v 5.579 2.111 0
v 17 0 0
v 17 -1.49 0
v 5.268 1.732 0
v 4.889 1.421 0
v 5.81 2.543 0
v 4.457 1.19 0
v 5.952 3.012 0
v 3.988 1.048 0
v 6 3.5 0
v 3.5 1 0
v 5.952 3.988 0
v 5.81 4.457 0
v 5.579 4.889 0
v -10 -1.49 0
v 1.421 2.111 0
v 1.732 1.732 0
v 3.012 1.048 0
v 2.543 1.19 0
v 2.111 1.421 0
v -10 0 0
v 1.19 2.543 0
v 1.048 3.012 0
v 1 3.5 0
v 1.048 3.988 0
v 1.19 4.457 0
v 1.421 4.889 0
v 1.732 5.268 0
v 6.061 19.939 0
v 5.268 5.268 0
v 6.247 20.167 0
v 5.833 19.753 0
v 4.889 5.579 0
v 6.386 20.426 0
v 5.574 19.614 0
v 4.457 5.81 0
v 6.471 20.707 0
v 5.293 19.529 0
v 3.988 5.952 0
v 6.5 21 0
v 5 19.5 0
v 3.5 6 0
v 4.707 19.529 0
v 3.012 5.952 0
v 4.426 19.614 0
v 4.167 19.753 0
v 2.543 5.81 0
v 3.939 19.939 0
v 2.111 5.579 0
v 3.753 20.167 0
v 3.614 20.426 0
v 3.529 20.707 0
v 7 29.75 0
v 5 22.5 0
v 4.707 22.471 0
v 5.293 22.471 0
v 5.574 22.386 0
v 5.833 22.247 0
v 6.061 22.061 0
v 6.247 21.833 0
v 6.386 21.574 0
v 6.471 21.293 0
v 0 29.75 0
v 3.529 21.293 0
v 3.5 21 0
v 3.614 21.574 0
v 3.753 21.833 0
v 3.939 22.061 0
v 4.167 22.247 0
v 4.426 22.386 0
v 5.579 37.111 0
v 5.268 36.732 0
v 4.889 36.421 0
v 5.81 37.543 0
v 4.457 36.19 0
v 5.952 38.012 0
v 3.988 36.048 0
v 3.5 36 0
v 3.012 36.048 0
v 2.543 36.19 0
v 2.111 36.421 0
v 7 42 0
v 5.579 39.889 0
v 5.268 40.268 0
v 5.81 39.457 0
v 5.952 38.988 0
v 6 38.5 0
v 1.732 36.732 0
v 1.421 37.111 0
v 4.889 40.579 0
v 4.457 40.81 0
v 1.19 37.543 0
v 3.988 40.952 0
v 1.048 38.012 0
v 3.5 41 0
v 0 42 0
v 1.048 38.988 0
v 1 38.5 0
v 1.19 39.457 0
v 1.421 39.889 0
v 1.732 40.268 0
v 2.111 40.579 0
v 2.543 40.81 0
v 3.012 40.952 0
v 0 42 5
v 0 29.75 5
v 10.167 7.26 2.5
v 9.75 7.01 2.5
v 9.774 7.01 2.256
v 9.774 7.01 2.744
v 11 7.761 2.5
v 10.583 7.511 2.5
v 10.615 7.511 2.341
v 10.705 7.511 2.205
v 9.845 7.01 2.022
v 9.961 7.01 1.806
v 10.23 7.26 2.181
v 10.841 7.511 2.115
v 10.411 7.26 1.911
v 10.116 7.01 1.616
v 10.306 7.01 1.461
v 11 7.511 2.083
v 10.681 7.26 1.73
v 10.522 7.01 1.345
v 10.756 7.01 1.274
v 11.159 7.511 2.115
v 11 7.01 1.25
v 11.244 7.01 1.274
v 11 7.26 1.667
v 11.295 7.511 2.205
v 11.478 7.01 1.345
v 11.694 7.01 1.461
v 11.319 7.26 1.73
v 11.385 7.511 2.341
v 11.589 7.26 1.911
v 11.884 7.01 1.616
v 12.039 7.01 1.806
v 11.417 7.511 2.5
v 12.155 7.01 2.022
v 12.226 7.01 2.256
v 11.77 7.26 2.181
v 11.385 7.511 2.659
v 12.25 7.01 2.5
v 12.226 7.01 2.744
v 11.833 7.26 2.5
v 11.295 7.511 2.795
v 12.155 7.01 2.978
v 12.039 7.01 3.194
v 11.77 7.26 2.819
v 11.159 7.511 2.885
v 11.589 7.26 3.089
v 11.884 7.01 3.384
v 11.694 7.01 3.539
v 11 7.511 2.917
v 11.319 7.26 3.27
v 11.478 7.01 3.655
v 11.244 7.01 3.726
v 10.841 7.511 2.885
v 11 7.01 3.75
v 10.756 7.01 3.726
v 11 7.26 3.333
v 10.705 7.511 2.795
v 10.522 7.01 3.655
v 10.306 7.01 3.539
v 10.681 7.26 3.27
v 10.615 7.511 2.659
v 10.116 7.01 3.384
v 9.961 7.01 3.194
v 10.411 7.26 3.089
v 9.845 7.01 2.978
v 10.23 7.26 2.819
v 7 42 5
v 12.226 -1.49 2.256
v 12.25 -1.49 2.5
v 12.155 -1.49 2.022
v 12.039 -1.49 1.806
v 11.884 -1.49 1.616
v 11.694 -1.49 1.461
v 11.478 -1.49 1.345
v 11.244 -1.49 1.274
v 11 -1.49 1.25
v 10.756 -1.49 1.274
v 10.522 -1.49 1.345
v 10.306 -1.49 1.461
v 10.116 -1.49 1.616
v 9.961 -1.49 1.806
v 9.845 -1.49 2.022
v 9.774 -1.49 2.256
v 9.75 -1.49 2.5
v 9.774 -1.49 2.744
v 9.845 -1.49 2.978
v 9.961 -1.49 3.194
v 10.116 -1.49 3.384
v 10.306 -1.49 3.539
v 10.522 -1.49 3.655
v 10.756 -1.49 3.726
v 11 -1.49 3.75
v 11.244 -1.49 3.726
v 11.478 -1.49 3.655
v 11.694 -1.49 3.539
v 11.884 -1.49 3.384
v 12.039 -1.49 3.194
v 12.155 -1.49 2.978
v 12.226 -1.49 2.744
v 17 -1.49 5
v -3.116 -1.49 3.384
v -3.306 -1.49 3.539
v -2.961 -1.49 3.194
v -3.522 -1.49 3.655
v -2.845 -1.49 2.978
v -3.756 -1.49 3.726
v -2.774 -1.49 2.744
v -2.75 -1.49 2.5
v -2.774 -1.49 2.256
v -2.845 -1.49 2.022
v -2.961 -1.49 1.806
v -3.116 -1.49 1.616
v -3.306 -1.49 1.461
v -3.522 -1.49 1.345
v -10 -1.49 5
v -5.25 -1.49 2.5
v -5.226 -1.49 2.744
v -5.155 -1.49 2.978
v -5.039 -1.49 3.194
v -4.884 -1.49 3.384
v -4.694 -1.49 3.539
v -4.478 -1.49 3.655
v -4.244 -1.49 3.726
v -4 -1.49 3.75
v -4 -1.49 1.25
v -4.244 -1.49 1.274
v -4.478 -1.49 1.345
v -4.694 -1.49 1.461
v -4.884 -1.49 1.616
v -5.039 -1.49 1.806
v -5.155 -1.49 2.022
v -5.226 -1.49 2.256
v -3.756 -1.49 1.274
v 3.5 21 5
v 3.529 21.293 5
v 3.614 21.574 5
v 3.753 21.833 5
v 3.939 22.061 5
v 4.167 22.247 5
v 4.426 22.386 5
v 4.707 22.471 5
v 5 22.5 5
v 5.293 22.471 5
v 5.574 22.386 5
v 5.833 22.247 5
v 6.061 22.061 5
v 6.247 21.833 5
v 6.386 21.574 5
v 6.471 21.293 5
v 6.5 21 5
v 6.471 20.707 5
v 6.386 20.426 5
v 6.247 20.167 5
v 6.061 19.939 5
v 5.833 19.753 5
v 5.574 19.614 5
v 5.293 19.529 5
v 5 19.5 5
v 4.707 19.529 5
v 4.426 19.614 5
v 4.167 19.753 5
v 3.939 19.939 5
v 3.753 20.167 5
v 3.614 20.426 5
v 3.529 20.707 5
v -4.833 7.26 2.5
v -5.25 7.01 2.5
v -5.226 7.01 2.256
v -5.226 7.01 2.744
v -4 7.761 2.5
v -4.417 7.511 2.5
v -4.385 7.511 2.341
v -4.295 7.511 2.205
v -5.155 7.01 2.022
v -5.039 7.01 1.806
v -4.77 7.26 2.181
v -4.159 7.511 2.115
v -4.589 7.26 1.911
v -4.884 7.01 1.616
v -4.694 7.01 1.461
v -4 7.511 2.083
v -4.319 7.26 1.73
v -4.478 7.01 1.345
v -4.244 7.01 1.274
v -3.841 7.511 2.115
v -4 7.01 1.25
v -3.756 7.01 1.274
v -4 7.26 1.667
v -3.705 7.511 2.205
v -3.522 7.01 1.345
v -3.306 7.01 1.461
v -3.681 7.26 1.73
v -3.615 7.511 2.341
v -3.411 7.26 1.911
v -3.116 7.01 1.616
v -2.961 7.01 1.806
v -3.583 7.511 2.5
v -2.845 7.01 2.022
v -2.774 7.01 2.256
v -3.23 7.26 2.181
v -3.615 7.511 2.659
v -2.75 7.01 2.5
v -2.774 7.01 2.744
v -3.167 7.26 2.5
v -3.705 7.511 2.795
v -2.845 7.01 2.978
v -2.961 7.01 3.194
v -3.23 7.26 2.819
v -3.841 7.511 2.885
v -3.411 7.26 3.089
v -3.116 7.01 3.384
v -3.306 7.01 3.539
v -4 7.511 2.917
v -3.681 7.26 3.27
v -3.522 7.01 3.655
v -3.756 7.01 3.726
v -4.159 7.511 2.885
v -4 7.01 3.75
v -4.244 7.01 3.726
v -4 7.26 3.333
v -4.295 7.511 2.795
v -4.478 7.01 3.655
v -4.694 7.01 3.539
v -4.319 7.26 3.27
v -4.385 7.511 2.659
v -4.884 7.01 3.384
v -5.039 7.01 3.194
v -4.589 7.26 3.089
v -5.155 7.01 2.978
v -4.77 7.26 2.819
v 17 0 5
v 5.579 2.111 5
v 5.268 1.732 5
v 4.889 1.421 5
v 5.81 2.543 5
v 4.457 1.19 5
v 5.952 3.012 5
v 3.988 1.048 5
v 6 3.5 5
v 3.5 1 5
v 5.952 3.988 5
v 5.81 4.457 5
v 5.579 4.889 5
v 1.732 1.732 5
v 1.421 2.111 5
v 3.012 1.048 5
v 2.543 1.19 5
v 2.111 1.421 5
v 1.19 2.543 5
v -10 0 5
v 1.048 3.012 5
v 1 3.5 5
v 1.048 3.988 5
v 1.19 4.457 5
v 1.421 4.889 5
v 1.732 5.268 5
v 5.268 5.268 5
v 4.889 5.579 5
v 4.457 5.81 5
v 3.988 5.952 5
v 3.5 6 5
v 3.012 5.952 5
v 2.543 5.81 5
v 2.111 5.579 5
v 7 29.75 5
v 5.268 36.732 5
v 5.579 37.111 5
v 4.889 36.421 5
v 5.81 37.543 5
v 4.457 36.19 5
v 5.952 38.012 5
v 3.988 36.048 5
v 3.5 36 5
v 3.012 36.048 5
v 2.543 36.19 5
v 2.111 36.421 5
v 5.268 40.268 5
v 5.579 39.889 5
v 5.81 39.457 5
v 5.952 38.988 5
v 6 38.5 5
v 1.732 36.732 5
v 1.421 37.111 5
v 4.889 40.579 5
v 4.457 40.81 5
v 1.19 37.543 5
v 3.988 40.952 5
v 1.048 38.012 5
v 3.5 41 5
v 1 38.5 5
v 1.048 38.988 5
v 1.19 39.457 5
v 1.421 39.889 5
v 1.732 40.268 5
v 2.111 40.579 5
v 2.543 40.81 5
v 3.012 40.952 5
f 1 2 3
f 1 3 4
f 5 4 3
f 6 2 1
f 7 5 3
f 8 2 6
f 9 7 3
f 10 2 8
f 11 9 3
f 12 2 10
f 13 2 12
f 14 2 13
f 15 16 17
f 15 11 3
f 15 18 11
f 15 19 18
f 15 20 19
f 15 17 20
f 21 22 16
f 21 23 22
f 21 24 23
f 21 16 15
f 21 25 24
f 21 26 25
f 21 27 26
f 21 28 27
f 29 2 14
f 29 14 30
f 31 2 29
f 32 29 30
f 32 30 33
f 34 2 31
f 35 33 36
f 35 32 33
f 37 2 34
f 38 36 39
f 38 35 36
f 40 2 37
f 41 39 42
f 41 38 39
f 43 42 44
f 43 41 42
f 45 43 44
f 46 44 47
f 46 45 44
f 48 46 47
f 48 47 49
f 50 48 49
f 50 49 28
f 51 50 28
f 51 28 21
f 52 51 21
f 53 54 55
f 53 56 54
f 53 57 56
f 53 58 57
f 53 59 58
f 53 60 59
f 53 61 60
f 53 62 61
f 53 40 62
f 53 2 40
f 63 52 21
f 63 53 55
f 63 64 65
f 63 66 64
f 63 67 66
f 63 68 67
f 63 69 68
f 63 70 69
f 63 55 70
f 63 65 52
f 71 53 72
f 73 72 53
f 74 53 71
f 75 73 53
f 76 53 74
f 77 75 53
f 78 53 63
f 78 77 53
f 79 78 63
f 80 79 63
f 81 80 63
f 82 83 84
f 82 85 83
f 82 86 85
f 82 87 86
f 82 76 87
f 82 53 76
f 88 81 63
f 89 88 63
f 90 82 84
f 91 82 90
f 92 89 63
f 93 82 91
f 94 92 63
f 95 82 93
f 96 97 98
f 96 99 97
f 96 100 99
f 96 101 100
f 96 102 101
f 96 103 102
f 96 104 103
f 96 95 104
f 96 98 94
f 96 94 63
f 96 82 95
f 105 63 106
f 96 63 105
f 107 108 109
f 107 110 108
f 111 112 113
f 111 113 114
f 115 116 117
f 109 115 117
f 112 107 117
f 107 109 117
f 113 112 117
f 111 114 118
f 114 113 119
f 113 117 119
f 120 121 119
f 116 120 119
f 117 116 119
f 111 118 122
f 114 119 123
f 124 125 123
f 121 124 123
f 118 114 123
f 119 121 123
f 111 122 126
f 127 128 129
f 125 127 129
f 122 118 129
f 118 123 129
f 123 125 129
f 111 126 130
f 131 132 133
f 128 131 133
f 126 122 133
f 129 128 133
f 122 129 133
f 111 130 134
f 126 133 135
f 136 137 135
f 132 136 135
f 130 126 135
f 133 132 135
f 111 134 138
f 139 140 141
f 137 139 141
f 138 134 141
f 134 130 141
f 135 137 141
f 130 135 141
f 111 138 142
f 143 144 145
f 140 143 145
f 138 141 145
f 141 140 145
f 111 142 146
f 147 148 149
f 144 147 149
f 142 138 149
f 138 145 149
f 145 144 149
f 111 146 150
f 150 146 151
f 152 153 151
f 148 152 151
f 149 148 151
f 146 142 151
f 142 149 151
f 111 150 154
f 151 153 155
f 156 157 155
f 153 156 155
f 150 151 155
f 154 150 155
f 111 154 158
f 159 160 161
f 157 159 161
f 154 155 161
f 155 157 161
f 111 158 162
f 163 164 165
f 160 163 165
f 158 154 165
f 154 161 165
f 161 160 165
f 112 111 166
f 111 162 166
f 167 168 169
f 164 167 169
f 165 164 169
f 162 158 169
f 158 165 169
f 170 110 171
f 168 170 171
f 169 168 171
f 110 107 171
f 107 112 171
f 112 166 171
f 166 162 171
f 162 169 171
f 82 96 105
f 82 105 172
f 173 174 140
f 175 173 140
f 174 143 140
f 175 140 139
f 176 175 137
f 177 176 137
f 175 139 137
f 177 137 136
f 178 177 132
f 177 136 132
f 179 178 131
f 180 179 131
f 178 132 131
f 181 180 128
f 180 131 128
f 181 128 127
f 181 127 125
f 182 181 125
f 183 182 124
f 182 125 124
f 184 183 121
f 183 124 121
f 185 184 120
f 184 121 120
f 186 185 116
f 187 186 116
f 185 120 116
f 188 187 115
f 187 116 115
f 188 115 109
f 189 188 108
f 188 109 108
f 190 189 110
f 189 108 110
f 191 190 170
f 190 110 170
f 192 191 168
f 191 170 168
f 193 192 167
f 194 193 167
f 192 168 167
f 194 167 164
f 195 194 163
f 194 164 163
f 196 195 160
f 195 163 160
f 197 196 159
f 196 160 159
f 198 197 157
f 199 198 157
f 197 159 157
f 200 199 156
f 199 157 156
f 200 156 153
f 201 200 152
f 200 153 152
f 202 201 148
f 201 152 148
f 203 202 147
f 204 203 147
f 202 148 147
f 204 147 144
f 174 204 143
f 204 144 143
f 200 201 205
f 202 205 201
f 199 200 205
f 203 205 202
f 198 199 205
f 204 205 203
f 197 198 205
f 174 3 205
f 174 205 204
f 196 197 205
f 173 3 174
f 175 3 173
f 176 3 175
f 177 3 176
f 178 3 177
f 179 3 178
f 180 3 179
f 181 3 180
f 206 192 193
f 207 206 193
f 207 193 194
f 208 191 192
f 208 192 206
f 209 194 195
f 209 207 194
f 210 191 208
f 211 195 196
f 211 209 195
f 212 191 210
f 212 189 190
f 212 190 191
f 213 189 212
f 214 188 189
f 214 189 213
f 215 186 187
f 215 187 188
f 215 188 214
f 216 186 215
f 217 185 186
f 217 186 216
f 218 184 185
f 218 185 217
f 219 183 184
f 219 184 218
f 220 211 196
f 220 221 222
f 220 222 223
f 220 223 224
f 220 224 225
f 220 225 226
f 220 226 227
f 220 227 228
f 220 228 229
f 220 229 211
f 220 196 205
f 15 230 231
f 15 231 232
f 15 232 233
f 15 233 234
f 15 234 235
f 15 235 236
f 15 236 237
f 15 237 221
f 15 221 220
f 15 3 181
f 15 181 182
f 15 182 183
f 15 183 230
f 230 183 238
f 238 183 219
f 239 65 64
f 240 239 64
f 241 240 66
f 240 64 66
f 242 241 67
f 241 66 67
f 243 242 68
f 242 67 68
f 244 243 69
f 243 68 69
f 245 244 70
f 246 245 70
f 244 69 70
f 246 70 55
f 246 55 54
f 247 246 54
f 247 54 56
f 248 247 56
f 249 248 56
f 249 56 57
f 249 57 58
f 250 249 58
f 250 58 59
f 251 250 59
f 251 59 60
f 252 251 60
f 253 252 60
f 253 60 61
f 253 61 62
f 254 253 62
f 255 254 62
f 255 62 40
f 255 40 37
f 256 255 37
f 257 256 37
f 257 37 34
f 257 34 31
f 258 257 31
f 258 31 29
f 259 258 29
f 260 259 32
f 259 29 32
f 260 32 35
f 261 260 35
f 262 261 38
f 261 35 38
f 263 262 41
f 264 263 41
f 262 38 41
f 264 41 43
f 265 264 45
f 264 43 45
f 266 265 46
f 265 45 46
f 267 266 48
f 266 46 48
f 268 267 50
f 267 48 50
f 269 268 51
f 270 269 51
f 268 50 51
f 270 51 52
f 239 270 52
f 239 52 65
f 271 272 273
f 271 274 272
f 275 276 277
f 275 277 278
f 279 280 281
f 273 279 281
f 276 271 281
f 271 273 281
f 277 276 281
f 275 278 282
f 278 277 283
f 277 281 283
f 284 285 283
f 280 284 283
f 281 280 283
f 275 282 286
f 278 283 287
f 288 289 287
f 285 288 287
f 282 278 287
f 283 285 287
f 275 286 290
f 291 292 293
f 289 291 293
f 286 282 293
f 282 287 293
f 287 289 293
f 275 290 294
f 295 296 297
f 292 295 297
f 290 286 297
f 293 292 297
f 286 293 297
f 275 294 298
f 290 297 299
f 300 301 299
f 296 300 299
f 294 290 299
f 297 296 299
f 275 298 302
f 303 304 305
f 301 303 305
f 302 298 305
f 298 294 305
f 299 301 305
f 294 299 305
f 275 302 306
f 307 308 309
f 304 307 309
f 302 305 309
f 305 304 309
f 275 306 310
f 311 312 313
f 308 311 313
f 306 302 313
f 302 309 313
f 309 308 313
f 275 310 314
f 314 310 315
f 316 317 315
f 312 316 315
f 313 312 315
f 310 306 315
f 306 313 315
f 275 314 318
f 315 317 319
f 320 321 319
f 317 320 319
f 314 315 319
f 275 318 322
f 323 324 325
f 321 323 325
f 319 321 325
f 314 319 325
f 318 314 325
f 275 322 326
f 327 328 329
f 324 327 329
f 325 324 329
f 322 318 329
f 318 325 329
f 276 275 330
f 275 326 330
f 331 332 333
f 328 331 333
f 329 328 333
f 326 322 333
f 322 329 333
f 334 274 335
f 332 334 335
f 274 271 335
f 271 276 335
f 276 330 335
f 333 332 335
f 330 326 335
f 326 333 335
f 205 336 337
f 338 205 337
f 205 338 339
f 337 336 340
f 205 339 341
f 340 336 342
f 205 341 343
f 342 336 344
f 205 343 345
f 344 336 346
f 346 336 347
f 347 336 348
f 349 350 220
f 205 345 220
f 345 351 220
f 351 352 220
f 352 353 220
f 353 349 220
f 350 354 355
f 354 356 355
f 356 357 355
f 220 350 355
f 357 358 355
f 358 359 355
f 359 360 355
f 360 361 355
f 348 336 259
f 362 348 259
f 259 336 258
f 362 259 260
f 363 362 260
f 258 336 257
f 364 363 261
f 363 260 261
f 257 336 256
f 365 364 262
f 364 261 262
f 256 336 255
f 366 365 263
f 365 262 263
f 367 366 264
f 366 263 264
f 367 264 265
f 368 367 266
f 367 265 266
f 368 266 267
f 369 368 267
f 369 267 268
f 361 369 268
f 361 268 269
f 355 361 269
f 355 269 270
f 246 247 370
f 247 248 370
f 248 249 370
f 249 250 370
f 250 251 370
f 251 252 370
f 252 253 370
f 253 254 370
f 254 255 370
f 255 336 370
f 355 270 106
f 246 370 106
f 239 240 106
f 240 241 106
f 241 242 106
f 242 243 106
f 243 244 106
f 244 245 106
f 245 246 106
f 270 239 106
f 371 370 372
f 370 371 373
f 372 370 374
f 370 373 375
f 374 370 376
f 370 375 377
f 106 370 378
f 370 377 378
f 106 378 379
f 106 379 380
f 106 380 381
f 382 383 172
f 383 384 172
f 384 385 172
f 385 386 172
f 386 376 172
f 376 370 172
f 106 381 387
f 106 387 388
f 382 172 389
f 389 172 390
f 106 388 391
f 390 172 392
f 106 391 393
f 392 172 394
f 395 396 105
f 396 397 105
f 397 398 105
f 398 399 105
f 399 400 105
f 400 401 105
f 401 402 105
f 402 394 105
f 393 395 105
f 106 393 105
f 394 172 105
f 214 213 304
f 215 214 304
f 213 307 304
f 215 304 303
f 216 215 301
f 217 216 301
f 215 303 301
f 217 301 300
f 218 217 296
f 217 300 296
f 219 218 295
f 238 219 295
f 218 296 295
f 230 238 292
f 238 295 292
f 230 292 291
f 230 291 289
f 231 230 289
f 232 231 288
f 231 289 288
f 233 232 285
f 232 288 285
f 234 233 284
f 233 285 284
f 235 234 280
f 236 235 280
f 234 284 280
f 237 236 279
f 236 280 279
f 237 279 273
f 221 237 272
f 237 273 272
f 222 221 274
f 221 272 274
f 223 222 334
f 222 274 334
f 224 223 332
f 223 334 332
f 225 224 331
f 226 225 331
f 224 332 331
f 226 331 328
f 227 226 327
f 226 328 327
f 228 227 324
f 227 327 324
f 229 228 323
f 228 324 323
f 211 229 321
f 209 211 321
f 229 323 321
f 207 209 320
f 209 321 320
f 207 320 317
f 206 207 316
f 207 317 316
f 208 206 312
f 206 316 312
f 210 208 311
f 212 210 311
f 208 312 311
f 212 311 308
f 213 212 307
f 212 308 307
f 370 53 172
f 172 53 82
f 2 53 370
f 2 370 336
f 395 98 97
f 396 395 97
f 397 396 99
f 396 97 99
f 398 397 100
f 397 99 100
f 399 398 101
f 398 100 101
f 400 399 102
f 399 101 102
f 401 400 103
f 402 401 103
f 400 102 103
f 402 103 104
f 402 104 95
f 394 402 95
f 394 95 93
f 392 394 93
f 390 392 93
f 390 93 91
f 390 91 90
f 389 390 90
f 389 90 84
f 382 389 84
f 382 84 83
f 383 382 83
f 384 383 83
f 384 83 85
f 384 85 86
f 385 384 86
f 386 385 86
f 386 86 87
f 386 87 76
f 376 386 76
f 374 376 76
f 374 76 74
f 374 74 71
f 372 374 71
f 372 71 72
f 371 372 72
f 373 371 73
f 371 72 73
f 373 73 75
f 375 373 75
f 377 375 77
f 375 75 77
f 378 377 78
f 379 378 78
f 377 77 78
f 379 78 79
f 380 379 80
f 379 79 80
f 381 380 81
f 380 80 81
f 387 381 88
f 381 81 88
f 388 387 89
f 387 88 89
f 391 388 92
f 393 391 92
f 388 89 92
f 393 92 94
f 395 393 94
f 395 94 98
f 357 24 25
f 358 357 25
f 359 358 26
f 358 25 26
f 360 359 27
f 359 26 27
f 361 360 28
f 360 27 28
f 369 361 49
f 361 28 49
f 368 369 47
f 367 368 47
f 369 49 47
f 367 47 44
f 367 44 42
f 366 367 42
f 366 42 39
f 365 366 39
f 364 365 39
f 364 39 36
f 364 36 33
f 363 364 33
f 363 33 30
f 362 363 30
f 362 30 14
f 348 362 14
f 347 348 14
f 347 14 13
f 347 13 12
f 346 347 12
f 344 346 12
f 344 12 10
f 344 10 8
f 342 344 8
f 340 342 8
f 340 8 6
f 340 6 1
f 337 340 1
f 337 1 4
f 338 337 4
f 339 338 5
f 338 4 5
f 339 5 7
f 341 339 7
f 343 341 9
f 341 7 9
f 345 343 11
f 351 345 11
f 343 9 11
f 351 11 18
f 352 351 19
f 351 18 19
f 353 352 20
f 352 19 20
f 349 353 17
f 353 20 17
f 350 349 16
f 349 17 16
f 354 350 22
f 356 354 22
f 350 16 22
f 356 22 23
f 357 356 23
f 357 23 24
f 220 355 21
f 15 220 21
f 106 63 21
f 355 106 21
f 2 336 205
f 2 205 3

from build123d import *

# Parameters (mm, degrees)
ESQUISSE1_W             = 7
ESQUISSE1_H             = 42
BOSS_EXTRU_1_DEPTH      = 5
ESQUISSE2_R             = 2.5
ENL_V_MAT_EXTRU_1_DEPTH = 43.87190222
ESQUISSE3_R             = 1.5
ENL_V_MAT_EXTRU_2_DEPTH = 10
BOSS_EXTRU_2_DEPTH      = 5
ESQUISSE7_W             = 27
ESQUISSE7_H             = 5
BOSS_EXTRU_3_DEPTH      = 1.49
TROU_TARAUD_M32_D       = 2.5
TROU_TARAUD_M32_DEPTH   = 8.5
TROU_TARAUD_M32_TIP     = 0.751075774


with BuildPart() as part:
    # Esquisse1 → Boss.-Extru.1 (new body)
    with BuildSketch(Plane.XY):
        with Locations((3.5, 21)):
            Rectangle(ESQUISSE1_W, ESQUISSE1_H)
    extrude(amount=BOSS_EXTRU_1_DEPTH)

    # Esquisse2 → Enlèv. mat.-Extru.1 (cut, through all)
    with BuildSketch(Plane(origin=(0, 0, 0), x_dir=(-1, 0, 0), z_dir=(0, 0, -1))):
        with Locations((-3.5, 38.5)):
            Circle(ESQUISSE2_R)
        with Locations((-3.5, 3.5)):
            Circle(ESQUISSE2_R)
    extrude(amount=-ENL_V_MAT_EXTRU_1_DEPTH, mode=Mode.SUBTRACT)

    # Esquisse3 → Enlèv. mat.-Extru.2 (cut)
    with BuildSketch(Plane(origin=(0, 0, 0), x_dir=(-1, 0, 0), z_dir=(0, 0, -1))):
        with Locations((-5, 21)):
            Circle(ESQUISSE3_R)
    extrude(amount=-ENL_V_MAT_EXTRU_2_DEPTH, mode=Mode.SUBTRACT)

    # Esquisse4 → Boss.-Extru.2 (add)
    with BuildSketch(Plane(origin=(0, 0, 0), x_dir=(-1, 0, 0), z_dir=(0, 0, -1))):
        Polygon((-7, 29.75), (-17, 0), (-7, 0), align=None)
        Polygon((10, 0), (0, 0), (0, 29.75), align=None)
    extrude(amount=-BOSS_EXTRU_2_DEPTH)

    # Esquisse7 → Boss.-Extru.3 (add)
    with BuildSketch(Plane(origin=(0, 0, 0), x_dir=(-1, 0, 0), z_dir=(0, -1, 0))):
        with Locations((-3.5, -2.5)):
            Rectangle(ESQUISSE7_W, ESQUISSE7_H)
    extrude(amount=BOSS_EXTRU_3_DEPTH)

    # Trou taraudé M32
    with Locations(Plane(origin=(0, -1.49, 0), x_dir=(-1, 0, 0), z_dir=(0, -1, 0))):
        with Locations((4, -2.5), (-11, -2.5)):
            Hole(TROU_TARAUD_M32_D / 2, depth=TROU_TARAUD_M32_DEPTH)
            with Locations((0, 0, -(TROU_TARAUD_M32_DEPTH + TROU_TARAUD_M32_TIP / 2))):  # 118° drill point
                Cone(0, TROU_TARAUD_M32_D / 2, TROU_TARAUD_M32_TIP, mode=Mode.SUBTRACT)


solid = part.part
